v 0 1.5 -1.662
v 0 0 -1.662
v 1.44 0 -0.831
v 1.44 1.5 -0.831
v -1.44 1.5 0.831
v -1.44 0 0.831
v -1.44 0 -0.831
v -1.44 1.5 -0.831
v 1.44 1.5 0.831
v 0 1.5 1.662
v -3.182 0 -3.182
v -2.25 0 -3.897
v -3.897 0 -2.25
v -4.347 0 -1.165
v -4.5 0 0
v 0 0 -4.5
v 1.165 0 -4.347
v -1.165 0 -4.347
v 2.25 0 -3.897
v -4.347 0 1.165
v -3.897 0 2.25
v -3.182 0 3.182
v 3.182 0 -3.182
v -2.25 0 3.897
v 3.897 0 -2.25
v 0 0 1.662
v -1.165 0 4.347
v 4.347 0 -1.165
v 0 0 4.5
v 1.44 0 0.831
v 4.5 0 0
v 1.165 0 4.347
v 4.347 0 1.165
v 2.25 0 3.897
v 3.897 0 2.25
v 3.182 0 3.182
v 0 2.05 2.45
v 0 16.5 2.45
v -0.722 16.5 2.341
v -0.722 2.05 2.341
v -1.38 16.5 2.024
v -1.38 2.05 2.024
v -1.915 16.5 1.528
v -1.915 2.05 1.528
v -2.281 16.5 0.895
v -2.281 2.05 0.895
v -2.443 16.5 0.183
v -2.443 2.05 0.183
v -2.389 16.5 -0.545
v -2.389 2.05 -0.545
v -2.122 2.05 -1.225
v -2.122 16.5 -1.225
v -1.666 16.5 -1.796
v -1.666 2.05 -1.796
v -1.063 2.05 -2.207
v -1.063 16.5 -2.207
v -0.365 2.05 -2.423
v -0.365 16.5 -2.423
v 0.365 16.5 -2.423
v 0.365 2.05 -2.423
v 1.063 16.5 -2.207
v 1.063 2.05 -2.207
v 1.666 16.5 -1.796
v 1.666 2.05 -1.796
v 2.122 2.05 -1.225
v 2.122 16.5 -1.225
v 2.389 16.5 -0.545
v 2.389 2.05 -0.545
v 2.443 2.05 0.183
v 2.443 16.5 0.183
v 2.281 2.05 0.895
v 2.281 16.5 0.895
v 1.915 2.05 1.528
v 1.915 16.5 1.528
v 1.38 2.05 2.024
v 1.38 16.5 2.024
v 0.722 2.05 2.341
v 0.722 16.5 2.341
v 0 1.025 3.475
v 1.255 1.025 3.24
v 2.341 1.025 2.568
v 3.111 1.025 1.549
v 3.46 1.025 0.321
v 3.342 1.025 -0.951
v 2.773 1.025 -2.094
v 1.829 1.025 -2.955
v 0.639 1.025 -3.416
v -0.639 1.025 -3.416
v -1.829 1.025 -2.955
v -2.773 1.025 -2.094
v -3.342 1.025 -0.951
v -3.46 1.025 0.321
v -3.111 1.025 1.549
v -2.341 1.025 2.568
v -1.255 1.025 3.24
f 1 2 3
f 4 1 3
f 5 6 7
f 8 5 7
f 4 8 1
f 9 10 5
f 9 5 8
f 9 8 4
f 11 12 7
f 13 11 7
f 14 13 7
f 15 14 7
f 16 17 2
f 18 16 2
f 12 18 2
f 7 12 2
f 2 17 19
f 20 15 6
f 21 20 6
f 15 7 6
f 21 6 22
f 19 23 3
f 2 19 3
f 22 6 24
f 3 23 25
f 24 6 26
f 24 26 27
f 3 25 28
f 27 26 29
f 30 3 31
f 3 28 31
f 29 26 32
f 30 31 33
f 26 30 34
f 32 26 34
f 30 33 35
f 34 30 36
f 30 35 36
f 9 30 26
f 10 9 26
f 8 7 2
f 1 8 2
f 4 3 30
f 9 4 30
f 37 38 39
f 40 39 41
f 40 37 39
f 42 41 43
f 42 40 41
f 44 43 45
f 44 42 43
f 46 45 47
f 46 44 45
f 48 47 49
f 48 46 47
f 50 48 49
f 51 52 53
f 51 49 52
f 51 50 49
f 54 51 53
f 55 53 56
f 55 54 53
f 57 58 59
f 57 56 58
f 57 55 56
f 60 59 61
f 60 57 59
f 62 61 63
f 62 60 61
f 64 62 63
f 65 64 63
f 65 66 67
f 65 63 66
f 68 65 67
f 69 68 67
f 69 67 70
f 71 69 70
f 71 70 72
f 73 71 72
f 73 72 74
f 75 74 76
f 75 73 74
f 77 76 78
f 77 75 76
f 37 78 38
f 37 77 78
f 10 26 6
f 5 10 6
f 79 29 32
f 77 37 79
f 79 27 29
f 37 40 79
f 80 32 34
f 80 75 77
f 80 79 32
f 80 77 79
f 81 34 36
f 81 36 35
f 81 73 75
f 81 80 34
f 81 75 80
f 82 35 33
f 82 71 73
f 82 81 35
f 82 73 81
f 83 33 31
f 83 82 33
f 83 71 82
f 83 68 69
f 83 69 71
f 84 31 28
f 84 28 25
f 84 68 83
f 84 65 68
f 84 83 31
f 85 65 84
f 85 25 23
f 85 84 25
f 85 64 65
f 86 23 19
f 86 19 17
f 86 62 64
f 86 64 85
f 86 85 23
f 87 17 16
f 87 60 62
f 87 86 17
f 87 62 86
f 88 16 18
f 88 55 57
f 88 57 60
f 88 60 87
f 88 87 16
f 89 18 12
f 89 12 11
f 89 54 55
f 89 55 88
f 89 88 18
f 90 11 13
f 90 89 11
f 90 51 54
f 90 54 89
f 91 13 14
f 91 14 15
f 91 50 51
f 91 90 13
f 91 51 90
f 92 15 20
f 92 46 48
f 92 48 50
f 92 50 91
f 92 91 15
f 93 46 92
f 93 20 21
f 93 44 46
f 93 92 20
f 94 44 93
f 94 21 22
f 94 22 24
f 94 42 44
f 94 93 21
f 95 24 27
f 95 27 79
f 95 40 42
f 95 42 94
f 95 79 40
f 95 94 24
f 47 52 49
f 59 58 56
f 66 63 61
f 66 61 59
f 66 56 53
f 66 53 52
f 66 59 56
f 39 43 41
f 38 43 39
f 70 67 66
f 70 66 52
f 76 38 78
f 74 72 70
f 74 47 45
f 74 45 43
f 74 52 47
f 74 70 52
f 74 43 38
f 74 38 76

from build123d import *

# Parameters (mm, degrees)
SKETCH1_R           = 4.5
BOSS_EXTRUDE1_DEPTH = 2.5
SKETCH2_R           = 2.45
BOSS_EXTRUDE2_DEPTH = 14
CHAMFER1_SIZE       = 2.5
CUT_EXTRUDE1_DEPTH  = 1.5


with BuildPart() as part:
    # Sketch1 → Boss-Extrude1 (new body)
    with BuildSketch(Plane(origin=(0, 0, 0), x_dir=(1, 0, 0), z_dir=(0, 1, 0))):
        with Locations(Location((0, 0, 0), (0, 0, 270))):
            Circle(SKETCH1_R)
    extrude(amount=BOSS_EXTRUDE1_DEPTH)

    # Sketch2 → Boss-Extrude2 (add)
    with BuildSketch(Plane(origin=(0, 2.5, 0), x_dir=(1, 0, 0), z_dir=(0, 1, 0))):
        with Locations(Location((0, 0, 0), (0, 0, 270))):
            Circle(SKETCH2_R)
    extrude(amount=BOSS_EXTRUDE2_DEPTH)

    # Chamfer1
    # the kernel refuses this chamfer: 2.5 mm, written as the material it takes off along each edge
    with BuildSketch(Plane(origin=(0, 2.5, 0), x_dir=(0, 0, 1), z_dir=(-1, 0, 0))) as chamfer1_piece_1_section:
        Polygon((4.5, -CHAMFER1_SIZE), (4.5 - CHAMFER1_SIZE, 0), (4.5, 0), align=None)
    chamfer1_piece_1 = revolve(axis=Axis((0, 2.5, 0), (0, 1, 0)), mode=Mode.PRIVATE)
    chamfer1_piece_1 = chamfer1_piece_1 - Plane(origin=(0, 1.019761833, 0), x_dir=(0, 0, 1), z_dir=(0, -1, 0)) * Cylinder(2.45, 18, mode=Mode.PRIVATE)
    add(chamfer1_piece_1, mode=Mode.SUBTRACT)

    # Sketch3 → Cut-Extrude1 (cut)
    with BuildSketch(Plane.XZ):
        Polygon((0, -1.662470902), (1.439742034, -0.831235451), (1.439742034, 0.831235451), (0, 1.662470902), (-1.439742034, 0.831235451), (-1.439742034, -0.831235451), align=None)
    extrude(amount=-CUT_EXTRUDE1_DEPTH, mode=Mode.SUBTRACT)


solid = part.part
